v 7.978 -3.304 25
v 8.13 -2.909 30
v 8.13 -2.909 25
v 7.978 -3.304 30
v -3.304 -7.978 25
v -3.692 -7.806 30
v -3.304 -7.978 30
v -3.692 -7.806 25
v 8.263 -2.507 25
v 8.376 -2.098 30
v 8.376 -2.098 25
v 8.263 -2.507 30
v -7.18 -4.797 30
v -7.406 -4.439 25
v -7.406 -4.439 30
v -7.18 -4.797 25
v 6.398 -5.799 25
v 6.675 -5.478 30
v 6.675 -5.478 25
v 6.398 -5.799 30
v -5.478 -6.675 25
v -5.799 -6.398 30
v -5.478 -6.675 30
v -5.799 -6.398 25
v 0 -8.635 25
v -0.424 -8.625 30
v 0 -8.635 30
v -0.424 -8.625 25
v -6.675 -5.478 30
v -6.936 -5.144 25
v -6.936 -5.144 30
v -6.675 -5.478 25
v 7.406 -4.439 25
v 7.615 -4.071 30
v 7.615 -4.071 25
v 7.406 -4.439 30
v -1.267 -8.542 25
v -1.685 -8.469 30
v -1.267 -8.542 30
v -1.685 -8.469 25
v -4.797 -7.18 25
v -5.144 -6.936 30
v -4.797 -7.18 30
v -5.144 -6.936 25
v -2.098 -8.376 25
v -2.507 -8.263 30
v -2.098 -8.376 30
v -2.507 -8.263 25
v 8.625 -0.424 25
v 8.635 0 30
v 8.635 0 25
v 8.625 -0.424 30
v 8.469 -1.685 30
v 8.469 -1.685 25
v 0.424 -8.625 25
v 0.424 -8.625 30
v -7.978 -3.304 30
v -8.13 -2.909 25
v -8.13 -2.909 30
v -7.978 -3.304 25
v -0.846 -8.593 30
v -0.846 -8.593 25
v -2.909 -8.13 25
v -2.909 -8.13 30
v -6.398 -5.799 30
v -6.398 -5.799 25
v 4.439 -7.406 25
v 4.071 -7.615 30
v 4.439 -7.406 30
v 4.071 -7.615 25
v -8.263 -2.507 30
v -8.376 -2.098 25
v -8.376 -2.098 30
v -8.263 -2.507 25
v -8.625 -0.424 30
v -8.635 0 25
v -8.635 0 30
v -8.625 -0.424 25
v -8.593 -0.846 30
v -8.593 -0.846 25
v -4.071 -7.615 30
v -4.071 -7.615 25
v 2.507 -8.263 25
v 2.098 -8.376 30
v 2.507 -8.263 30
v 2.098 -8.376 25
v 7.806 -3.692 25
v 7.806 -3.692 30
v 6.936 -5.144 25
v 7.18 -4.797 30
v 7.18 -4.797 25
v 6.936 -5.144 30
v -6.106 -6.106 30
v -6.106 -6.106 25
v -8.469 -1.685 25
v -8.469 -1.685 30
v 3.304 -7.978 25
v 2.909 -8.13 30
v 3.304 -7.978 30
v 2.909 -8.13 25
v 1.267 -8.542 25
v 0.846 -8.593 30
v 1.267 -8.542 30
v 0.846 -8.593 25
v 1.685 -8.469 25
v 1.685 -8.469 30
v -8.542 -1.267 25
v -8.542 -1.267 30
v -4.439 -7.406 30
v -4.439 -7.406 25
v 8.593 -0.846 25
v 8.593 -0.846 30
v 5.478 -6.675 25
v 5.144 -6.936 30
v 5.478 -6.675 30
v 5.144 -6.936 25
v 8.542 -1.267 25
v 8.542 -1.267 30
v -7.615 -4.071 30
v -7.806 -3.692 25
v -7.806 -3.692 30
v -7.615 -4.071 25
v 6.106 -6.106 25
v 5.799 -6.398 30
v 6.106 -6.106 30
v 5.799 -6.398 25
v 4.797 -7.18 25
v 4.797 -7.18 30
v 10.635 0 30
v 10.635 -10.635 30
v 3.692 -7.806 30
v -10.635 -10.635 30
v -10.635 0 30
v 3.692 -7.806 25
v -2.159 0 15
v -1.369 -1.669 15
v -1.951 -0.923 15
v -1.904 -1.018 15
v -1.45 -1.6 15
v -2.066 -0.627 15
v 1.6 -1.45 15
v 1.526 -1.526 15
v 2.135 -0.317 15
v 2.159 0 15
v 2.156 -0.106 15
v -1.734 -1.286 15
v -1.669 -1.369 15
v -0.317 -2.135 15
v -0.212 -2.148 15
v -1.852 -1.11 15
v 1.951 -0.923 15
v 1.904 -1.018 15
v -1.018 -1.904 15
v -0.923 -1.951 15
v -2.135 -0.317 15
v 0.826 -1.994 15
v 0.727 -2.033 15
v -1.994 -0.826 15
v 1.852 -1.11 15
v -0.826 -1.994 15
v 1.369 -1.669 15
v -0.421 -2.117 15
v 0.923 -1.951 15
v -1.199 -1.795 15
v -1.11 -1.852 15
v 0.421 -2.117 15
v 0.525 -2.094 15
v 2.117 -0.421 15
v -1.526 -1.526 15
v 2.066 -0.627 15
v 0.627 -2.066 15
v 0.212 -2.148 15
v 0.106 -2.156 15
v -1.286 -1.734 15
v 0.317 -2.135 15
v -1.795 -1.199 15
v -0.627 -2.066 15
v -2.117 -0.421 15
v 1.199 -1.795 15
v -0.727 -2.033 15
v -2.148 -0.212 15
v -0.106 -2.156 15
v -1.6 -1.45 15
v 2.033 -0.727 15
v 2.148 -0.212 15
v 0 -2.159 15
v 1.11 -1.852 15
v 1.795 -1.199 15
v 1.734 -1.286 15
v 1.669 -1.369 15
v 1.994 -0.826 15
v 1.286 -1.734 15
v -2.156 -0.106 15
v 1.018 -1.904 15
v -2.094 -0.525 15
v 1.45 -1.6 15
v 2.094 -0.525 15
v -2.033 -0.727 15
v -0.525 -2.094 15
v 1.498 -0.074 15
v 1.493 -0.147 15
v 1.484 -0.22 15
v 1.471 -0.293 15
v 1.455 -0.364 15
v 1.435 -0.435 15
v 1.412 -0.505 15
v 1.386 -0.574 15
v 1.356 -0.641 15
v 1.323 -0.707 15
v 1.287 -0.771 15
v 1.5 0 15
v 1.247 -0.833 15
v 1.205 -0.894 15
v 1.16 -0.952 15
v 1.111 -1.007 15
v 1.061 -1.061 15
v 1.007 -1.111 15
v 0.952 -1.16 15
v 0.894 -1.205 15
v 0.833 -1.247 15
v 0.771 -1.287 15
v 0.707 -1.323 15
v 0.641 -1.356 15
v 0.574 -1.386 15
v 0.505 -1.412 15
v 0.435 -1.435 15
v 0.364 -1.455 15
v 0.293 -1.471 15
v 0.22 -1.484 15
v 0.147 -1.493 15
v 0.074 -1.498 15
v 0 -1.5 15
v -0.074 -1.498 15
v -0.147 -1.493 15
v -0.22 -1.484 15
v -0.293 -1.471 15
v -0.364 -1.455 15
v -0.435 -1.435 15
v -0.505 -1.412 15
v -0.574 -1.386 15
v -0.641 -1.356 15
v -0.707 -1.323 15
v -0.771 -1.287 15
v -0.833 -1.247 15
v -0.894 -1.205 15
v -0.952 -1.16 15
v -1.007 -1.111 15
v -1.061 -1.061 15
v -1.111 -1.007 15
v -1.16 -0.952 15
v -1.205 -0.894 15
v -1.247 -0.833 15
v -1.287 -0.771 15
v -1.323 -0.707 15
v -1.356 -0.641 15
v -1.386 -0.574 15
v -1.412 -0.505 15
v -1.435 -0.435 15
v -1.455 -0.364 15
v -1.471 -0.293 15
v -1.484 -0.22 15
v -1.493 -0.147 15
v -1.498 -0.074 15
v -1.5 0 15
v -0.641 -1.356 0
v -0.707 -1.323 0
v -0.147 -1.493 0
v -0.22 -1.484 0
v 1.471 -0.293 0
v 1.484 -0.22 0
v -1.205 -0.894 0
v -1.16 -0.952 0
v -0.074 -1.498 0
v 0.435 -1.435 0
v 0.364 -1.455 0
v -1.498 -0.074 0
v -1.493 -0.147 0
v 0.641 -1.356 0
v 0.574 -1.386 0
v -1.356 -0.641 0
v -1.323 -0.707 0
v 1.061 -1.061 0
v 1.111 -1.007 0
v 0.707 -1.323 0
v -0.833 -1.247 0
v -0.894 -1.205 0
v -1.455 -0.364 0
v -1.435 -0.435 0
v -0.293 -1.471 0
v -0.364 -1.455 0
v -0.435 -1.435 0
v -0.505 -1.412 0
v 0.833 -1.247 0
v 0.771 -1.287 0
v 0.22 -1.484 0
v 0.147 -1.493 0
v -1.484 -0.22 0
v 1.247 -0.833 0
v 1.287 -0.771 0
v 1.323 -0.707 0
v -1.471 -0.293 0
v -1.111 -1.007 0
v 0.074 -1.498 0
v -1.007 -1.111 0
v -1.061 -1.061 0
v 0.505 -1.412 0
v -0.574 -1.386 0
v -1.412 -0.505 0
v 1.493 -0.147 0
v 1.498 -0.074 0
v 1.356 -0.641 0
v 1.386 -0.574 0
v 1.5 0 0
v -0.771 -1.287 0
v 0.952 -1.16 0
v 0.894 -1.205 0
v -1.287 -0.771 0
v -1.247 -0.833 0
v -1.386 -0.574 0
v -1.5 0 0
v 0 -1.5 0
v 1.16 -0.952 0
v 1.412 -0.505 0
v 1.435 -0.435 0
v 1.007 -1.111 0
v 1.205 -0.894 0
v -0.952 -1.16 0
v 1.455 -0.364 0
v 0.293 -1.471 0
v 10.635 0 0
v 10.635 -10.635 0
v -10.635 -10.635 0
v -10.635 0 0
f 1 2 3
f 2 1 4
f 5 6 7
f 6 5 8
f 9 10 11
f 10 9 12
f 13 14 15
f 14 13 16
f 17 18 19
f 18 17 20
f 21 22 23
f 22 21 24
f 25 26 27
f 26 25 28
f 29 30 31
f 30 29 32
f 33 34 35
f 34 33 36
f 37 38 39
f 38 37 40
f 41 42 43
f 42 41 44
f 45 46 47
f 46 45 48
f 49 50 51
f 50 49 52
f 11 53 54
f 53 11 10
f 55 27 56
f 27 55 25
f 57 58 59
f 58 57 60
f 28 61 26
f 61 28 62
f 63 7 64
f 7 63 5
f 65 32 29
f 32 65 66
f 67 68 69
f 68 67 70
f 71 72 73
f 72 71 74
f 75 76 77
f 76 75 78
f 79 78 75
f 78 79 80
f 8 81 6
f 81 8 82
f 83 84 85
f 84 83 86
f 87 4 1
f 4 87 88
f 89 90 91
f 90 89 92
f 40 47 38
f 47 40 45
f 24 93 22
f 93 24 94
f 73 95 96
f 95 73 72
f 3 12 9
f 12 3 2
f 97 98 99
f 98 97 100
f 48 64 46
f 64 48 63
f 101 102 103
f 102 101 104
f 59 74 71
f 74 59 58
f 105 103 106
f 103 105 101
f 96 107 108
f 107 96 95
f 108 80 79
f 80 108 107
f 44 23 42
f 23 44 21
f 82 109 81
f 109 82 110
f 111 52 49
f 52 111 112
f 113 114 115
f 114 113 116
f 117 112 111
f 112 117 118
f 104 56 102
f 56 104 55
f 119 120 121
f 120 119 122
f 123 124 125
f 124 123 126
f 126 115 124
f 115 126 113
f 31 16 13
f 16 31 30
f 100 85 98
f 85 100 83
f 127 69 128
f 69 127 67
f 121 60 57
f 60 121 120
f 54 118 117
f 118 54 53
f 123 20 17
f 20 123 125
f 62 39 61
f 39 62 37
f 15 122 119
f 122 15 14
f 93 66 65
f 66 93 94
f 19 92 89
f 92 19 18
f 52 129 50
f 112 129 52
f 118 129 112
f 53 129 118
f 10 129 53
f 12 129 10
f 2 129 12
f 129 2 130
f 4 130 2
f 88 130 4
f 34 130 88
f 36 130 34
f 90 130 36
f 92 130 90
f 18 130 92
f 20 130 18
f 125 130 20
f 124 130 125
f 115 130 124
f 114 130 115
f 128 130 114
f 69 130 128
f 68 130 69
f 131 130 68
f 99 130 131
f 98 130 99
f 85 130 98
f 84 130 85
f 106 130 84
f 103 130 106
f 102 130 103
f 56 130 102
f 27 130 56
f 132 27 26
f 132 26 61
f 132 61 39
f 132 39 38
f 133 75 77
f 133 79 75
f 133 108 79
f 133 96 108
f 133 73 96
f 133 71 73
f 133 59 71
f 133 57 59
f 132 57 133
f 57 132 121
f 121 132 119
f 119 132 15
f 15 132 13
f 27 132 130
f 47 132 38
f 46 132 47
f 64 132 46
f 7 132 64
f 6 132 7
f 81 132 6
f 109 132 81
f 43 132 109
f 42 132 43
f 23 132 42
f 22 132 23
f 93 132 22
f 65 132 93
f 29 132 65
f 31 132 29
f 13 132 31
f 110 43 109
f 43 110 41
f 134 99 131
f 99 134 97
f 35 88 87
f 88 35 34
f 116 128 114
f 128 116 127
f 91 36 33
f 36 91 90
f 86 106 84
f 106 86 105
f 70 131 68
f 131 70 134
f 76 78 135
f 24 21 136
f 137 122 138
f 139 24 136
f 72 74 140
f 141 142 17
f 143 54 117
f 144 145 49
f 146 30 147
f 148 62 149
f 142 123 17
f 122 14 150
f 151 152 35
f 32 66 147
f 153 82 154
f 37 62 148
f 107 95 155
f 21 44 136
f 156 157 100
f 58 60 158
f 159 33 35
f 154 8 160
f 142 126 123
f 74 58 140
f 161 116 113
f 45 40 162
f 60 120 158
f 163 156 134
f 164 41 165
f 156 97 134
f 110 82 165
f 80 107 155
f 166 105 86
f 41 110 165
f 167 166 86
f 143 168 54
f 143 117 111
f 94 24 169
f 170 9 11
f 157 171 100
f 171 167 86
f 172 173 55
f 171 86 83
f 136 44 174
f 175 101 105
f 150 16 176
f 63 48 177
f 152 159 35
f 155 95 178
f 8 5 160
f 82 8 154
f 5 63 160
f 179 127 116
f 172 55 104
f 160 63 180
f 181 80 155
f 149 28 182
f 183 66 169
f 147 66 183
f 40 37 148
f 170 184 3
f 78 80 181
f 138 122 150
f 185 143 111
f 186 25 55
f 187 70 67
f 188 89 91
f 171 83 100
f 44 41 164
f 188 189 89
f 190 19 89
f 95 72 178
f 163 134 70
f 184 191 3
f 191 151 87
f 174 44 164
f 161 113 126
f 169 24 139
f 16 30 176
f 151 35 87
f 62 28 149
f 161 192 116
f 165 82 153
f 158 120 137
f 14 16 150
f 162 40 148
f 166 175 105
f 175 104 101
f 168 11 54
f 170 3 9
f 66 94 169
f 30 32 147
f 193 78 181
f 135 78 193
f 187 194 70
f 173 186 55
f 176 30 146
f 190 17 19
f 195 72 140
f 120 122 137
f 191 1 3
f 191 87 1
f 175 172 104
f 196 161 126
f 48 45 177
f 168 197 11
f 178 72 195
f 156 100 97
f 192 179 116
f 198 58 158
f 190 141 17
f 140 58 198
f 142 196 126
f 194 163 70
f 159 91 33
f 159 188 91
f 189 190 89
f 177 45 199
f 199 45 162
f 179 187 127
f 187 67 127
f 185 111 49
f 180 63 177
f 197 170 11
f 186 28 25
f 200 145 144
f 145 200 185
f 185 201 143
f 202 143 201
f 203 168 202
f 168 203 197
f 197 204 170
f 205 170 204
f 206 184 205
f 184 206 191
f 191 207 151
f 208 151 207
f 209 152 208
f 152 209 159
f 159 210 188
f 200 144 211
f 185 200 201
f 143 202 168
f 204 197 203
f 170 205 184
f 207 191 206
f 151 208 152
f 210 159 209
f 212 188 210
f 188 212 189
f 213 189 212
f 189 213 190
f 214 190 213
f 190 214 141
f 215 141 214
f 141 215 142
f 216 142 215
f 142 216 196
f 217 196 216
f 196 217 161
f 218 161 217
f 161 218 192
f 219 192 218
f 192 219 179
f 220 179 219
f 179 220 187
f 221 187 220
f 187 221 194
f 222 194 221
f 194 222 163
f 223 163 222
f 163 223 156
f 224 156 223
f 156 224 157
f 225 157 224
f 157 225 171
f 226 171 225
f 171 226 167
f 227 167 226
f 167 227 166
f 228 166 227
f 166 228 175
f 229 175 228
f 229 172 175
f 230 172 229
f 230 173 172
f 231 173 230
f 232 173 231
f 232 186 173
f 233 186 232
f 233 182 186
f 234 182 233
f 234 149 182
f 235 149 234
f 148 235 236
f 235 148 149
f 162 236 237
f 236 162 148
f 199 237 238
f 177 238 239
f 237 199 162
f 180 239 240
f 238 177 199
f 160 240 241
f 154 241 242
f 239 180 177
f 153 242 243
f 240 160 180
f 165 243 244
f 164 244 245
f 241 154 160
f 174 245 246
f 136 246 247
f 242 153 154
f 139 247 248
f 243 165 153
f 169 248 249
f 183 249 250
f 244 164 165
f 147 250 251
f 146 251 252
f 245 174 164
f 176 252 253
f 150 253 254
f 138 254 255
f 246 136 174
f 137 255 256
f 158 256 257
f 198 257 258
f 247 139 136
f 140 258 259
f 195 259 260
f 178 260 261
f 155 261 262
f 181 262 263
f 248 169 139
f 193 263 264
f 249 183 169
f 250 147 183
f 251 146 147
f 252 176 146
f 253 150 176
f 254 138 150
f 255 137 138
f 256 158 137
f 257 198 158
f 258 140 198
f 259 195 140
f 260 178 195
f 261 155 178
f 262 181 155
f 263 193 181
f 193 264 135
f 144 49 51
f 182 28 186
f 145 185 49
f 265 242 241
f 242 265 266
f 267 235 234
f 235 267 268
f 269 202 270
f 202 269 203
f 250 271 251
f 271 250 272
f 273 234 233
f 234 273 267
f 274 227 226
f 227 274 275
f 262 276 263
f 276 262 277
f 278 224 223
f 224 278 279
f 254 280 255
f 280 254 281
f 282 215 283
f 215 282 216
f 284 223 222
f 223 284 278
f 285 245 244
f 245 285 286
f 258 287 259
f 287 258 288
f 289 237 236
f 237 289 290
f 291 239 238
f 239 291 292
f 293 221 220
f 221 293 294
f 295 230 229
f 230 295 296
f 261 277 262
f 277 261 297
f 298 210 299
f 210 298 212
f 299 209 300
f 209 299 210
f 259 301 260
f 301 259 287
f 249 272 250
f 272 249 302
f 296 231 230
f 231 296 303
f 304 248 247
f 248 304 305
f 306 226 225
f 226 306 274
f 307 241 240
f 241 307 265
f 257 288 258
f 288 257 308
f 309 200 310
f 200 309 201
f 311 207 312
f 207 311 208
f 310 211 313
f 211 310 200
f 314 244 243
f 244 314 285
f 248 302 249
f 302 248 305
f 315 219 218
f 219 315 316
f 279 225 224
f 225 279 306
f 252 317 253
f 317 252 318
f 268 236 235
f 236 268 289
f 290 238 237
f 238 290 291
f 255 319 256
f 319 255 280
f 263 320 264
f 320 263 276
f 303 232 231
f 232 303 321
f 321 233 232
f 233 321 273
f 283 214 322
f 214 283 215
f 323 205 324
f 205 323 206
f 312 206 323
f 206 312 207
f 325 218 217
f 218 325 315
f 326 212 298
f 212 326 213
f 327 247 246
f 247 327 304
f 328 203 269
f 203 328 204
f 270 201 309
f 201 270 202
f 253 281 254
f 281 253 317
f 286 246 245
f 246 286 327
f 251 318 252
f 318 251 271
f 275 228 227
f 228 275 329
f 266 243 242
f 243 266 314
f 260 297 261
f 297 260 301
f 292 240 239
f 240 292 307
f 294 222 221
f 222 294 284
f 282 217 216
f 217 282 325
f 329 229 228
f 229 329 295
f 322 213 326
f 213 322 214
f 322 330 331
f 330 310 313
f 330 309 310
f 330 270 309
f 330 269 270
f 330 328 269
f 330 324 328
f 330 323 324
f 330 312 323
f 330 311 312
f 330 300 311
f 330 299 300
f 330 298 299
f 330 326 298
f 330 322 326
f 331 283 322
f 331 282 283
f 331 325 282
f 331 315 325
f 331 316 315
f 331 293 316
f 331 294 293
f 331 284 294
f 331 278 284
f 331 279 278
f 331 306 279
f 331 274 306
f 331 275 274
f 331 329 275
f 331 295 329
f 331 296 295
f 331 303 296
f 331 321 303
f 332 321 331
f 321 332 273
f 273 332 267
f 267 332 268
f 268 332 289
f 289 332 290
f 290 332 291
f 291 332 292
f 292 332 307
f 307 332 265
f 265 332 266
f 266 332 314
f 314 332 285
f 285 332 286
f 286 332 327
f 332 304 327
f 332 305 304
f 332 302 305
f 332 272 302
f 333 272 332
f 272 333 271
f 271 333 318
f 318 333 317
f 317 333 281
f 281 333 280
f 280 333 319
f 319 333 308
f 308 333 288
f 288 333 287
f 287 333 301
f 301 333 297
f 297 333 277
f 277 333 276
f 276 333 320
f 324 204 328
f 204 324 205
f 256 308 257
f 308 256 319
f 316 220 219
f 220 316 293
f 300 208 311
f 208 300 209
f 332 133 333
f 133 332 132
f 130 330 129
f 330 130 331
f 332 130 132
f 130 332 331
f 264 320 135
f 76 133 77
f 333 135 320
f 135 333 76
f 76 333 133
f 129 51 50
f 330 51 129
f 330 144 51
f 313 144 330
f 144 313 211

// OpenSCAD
$fn = 128;

bullet_diameter     = 17.27;
bullet_tip_diameter = 3;
bullet_height       = 30;
bullet_amount       = 1;
mold_wall           = 2;

half_mold(bullet_amount,
          bullet_diameter, 
          bullet_tip_diameter, 
          bullet_height, 
          mold_wall);

module half_mold(amount, diameter, tip, height, wall) {
    
    mold_width=diameter+2*wall;
    
    module single_mold(diameter,tip,wall,height) {
        difference(){
            translate([0,0,height/2]) {
                cube([mold_width,mold_width,height],center=true);
            }
            union(){
                cylinder(1/6*height, d=diameter);
                translate([0,0,1/6*height]) {
                    cylinder(2/6*height, d1=diameter, d2=diameter/4);
                }
                translate([0,0,3/6*height]) {
                    cylinder(3/6*height, d1=tip, d2=tip);
                }
            }
        }
    }    


    module molds(amount){
        for (i=[0 : mold_width : mold_width*(amount-1)]) {
            translate([i,0,0]) {
                single_mold(diameter,tip,wall,height);
            }
        }
    }
    
    
    translate([0,0,height]){
        rotate([0,180,0]) {
            difference(){
                molds(amount);
                translate([-mold_width/2,0,0])
                    cube([mold_width*amount+0.2,mold_width,height]);
            }
        }
    }
}
